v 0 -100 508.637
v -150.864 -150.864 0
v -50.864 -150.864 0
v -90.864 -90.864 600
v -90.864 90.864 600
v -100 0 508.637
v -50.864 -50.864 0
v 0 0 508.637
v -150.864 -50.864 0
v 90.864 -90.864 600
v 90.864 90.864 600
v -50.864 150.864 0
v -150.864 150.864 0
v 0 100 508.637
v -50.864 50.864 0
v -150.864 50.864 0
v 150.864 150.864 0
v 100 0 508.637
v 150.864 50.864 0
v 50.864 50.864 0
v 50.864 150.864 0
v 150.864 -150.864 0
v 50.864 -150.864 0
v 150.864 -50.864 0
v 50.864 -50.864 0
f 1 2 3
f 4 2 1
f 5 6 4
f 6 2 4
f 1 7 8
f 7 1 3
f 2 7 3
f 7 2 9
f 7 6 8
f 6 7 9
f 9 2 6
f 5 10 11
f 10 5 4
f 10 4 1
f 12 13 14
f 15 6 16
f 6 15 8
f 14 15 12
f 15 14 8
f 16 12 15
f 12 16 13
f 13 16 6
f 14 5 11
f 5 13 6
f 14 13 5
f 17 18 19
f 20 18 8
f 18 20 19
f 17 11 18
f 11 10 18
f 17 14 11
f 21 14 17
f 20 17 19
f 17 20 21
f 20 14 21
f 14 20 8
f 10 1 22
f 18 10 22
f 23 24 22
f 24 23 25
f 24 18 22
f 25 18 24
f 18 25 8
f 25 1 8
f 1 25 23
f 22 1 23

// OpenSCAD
// Archiyou -> OpenSCAD  |  script: tomy  |  units: mm
// OpenSCAD has no units: coordinates are in mm.
// Parts: 0 CSG, 4 baked, 0 2D
//   baked: leg (shape was not recorded)
//   baked: legFrontRight (made by copy())
//   baked: legBackRight (made by copy())
//   baked: legBackLeft (made by copy())
// Parameters at export, for reference only (nothing in this file is linked to them):
//   HEIGHT = 600
//   BEAM_WIDTH = 100
//   LEG_OFFSET = 60

$fn = 32;
PART = "";

// leg  (layer legs): baked, shape was not recorded
module leg() {
    color([0, 0.502, 0]) polyhedron(
        points = [[-150.863749435, -150.863749435, 0], [-50.8637494353, -150.863749435, 0], [0, -100, 508.637494353], [0, -90.8637494353, 600], [-90.8637494353, -90.8637494353, 600], [-150.863749435, -50.8637494353, 0], [-100, 0, 508.637494353], [0, 0, 508.637494353], [-50.8637494353, -50.8637494353, 0], [0, 0, 600], [-90.8637494353, 0, 600]],
        faces = [[4, 3, 2, 1, 0], [8, 7, 6, 5], [0, 1, 8, 5], [3, 4, 10, 9], [10, 4, 0, 5, 6], [7, 2, 3, 9], [10, 6, 7, 9], [1, 2, 7, 8]]
    );
}

// legFrontRight  (layer legs): baked, made by copy()
module legFrontRight() {
    color([0, 0.502, 0]) polyhedron(
        points = [[0, 0, 600], [0, 0, 508.637494353], [0, 100, 508.637494353], [0, 90.8637494353, 600], [-100, 0, 508.637494353], [-150.863749435, 50.8637494353, 0], [-50.8637494353, 50.8637494353, 0], [-50.8637494353, 150.863749435, 0], [-150.863749435, 150.863749435, 0], [-90.8637494353, 90.8637494353, 600], [-90.8637494353, 0, 600]],
        faces = [[3, 2, 1, 0], [1, 6, 5, 4], [2, 3, 9, 8, 7], [10, 0, 1, 4], [0, 10, 9, 3], [5, 8, 9, 10, 4], [6, 7, 8, 5], [7, 6, 1, 2]]
    );
}

// legBackRight  (layer legs): baked, made by copy()
module legBackRight() {
    color([0, 0.502, 0]) polyhedron(
        points = [[0, 0, 600], [90.8637494353, 0, 600], [90.8637494353, 90.8637494353, 600], [0, 90.8637494353, 600], [150.863749435, 50.8637494353, 0], [50.8637494353, 50.8637494353, 0], [50.8637494353, 150.863749435, 0], [150.863749435, 150.863749435, 0], [0, 100, 508.637494353], [0, 0, 508.637494353], [100, 0, 508.637494353]],
        faces = [[3, 2, 1, 0], [7, 6, 5, 4], [8, 6, 7, 2, 3], [6, 8, 9, 5], [10, 4, 5, 9], [10, 9, 0, 1], [2, 7, 4, 10, 1], [0, 9, 8, 3]]
    );
}

// legBackLeft  (layer legs): baked, made by copy()
module legBackLeft() {
    color([0, 0.502, 0]) polyhedron(
        points = [[150.863749435, -50.8637494353, 0], [150.863749435, -150.863749435, 0], [50.8637494353, -150.863749435, 0], [50.8637494353, -50.8637494353, 0], [90.8637494353, 0, 600], [100, 0, 508.637494353], [0, 0, 508.637494353], [0, 0, 600], [0, -100, 508.637494353], [90.8637494353, -90.8637494353, 600], [0, -90.8637494353, 600]],
        faces = [[3, 2, 1, 0], [7, 6, 5, 4], [3, 6, 8, 2], [0, 1, 9, 4, 5], [10, 9, 1, 2, 8], [7, 4, 9, 10], [8, 6, 7, 10], [3, 0, 5, 6]]
    );
}

// 3D parts
if (PART == "" || PART == "leg") leg();
if (PART == "" || PART == "legFrontRight") legFrontRight();
if (PART == "" || PART == "legBackRight") legBackRight();
if (PART == "" || PART == "legBackLeft") legBackLeft();
